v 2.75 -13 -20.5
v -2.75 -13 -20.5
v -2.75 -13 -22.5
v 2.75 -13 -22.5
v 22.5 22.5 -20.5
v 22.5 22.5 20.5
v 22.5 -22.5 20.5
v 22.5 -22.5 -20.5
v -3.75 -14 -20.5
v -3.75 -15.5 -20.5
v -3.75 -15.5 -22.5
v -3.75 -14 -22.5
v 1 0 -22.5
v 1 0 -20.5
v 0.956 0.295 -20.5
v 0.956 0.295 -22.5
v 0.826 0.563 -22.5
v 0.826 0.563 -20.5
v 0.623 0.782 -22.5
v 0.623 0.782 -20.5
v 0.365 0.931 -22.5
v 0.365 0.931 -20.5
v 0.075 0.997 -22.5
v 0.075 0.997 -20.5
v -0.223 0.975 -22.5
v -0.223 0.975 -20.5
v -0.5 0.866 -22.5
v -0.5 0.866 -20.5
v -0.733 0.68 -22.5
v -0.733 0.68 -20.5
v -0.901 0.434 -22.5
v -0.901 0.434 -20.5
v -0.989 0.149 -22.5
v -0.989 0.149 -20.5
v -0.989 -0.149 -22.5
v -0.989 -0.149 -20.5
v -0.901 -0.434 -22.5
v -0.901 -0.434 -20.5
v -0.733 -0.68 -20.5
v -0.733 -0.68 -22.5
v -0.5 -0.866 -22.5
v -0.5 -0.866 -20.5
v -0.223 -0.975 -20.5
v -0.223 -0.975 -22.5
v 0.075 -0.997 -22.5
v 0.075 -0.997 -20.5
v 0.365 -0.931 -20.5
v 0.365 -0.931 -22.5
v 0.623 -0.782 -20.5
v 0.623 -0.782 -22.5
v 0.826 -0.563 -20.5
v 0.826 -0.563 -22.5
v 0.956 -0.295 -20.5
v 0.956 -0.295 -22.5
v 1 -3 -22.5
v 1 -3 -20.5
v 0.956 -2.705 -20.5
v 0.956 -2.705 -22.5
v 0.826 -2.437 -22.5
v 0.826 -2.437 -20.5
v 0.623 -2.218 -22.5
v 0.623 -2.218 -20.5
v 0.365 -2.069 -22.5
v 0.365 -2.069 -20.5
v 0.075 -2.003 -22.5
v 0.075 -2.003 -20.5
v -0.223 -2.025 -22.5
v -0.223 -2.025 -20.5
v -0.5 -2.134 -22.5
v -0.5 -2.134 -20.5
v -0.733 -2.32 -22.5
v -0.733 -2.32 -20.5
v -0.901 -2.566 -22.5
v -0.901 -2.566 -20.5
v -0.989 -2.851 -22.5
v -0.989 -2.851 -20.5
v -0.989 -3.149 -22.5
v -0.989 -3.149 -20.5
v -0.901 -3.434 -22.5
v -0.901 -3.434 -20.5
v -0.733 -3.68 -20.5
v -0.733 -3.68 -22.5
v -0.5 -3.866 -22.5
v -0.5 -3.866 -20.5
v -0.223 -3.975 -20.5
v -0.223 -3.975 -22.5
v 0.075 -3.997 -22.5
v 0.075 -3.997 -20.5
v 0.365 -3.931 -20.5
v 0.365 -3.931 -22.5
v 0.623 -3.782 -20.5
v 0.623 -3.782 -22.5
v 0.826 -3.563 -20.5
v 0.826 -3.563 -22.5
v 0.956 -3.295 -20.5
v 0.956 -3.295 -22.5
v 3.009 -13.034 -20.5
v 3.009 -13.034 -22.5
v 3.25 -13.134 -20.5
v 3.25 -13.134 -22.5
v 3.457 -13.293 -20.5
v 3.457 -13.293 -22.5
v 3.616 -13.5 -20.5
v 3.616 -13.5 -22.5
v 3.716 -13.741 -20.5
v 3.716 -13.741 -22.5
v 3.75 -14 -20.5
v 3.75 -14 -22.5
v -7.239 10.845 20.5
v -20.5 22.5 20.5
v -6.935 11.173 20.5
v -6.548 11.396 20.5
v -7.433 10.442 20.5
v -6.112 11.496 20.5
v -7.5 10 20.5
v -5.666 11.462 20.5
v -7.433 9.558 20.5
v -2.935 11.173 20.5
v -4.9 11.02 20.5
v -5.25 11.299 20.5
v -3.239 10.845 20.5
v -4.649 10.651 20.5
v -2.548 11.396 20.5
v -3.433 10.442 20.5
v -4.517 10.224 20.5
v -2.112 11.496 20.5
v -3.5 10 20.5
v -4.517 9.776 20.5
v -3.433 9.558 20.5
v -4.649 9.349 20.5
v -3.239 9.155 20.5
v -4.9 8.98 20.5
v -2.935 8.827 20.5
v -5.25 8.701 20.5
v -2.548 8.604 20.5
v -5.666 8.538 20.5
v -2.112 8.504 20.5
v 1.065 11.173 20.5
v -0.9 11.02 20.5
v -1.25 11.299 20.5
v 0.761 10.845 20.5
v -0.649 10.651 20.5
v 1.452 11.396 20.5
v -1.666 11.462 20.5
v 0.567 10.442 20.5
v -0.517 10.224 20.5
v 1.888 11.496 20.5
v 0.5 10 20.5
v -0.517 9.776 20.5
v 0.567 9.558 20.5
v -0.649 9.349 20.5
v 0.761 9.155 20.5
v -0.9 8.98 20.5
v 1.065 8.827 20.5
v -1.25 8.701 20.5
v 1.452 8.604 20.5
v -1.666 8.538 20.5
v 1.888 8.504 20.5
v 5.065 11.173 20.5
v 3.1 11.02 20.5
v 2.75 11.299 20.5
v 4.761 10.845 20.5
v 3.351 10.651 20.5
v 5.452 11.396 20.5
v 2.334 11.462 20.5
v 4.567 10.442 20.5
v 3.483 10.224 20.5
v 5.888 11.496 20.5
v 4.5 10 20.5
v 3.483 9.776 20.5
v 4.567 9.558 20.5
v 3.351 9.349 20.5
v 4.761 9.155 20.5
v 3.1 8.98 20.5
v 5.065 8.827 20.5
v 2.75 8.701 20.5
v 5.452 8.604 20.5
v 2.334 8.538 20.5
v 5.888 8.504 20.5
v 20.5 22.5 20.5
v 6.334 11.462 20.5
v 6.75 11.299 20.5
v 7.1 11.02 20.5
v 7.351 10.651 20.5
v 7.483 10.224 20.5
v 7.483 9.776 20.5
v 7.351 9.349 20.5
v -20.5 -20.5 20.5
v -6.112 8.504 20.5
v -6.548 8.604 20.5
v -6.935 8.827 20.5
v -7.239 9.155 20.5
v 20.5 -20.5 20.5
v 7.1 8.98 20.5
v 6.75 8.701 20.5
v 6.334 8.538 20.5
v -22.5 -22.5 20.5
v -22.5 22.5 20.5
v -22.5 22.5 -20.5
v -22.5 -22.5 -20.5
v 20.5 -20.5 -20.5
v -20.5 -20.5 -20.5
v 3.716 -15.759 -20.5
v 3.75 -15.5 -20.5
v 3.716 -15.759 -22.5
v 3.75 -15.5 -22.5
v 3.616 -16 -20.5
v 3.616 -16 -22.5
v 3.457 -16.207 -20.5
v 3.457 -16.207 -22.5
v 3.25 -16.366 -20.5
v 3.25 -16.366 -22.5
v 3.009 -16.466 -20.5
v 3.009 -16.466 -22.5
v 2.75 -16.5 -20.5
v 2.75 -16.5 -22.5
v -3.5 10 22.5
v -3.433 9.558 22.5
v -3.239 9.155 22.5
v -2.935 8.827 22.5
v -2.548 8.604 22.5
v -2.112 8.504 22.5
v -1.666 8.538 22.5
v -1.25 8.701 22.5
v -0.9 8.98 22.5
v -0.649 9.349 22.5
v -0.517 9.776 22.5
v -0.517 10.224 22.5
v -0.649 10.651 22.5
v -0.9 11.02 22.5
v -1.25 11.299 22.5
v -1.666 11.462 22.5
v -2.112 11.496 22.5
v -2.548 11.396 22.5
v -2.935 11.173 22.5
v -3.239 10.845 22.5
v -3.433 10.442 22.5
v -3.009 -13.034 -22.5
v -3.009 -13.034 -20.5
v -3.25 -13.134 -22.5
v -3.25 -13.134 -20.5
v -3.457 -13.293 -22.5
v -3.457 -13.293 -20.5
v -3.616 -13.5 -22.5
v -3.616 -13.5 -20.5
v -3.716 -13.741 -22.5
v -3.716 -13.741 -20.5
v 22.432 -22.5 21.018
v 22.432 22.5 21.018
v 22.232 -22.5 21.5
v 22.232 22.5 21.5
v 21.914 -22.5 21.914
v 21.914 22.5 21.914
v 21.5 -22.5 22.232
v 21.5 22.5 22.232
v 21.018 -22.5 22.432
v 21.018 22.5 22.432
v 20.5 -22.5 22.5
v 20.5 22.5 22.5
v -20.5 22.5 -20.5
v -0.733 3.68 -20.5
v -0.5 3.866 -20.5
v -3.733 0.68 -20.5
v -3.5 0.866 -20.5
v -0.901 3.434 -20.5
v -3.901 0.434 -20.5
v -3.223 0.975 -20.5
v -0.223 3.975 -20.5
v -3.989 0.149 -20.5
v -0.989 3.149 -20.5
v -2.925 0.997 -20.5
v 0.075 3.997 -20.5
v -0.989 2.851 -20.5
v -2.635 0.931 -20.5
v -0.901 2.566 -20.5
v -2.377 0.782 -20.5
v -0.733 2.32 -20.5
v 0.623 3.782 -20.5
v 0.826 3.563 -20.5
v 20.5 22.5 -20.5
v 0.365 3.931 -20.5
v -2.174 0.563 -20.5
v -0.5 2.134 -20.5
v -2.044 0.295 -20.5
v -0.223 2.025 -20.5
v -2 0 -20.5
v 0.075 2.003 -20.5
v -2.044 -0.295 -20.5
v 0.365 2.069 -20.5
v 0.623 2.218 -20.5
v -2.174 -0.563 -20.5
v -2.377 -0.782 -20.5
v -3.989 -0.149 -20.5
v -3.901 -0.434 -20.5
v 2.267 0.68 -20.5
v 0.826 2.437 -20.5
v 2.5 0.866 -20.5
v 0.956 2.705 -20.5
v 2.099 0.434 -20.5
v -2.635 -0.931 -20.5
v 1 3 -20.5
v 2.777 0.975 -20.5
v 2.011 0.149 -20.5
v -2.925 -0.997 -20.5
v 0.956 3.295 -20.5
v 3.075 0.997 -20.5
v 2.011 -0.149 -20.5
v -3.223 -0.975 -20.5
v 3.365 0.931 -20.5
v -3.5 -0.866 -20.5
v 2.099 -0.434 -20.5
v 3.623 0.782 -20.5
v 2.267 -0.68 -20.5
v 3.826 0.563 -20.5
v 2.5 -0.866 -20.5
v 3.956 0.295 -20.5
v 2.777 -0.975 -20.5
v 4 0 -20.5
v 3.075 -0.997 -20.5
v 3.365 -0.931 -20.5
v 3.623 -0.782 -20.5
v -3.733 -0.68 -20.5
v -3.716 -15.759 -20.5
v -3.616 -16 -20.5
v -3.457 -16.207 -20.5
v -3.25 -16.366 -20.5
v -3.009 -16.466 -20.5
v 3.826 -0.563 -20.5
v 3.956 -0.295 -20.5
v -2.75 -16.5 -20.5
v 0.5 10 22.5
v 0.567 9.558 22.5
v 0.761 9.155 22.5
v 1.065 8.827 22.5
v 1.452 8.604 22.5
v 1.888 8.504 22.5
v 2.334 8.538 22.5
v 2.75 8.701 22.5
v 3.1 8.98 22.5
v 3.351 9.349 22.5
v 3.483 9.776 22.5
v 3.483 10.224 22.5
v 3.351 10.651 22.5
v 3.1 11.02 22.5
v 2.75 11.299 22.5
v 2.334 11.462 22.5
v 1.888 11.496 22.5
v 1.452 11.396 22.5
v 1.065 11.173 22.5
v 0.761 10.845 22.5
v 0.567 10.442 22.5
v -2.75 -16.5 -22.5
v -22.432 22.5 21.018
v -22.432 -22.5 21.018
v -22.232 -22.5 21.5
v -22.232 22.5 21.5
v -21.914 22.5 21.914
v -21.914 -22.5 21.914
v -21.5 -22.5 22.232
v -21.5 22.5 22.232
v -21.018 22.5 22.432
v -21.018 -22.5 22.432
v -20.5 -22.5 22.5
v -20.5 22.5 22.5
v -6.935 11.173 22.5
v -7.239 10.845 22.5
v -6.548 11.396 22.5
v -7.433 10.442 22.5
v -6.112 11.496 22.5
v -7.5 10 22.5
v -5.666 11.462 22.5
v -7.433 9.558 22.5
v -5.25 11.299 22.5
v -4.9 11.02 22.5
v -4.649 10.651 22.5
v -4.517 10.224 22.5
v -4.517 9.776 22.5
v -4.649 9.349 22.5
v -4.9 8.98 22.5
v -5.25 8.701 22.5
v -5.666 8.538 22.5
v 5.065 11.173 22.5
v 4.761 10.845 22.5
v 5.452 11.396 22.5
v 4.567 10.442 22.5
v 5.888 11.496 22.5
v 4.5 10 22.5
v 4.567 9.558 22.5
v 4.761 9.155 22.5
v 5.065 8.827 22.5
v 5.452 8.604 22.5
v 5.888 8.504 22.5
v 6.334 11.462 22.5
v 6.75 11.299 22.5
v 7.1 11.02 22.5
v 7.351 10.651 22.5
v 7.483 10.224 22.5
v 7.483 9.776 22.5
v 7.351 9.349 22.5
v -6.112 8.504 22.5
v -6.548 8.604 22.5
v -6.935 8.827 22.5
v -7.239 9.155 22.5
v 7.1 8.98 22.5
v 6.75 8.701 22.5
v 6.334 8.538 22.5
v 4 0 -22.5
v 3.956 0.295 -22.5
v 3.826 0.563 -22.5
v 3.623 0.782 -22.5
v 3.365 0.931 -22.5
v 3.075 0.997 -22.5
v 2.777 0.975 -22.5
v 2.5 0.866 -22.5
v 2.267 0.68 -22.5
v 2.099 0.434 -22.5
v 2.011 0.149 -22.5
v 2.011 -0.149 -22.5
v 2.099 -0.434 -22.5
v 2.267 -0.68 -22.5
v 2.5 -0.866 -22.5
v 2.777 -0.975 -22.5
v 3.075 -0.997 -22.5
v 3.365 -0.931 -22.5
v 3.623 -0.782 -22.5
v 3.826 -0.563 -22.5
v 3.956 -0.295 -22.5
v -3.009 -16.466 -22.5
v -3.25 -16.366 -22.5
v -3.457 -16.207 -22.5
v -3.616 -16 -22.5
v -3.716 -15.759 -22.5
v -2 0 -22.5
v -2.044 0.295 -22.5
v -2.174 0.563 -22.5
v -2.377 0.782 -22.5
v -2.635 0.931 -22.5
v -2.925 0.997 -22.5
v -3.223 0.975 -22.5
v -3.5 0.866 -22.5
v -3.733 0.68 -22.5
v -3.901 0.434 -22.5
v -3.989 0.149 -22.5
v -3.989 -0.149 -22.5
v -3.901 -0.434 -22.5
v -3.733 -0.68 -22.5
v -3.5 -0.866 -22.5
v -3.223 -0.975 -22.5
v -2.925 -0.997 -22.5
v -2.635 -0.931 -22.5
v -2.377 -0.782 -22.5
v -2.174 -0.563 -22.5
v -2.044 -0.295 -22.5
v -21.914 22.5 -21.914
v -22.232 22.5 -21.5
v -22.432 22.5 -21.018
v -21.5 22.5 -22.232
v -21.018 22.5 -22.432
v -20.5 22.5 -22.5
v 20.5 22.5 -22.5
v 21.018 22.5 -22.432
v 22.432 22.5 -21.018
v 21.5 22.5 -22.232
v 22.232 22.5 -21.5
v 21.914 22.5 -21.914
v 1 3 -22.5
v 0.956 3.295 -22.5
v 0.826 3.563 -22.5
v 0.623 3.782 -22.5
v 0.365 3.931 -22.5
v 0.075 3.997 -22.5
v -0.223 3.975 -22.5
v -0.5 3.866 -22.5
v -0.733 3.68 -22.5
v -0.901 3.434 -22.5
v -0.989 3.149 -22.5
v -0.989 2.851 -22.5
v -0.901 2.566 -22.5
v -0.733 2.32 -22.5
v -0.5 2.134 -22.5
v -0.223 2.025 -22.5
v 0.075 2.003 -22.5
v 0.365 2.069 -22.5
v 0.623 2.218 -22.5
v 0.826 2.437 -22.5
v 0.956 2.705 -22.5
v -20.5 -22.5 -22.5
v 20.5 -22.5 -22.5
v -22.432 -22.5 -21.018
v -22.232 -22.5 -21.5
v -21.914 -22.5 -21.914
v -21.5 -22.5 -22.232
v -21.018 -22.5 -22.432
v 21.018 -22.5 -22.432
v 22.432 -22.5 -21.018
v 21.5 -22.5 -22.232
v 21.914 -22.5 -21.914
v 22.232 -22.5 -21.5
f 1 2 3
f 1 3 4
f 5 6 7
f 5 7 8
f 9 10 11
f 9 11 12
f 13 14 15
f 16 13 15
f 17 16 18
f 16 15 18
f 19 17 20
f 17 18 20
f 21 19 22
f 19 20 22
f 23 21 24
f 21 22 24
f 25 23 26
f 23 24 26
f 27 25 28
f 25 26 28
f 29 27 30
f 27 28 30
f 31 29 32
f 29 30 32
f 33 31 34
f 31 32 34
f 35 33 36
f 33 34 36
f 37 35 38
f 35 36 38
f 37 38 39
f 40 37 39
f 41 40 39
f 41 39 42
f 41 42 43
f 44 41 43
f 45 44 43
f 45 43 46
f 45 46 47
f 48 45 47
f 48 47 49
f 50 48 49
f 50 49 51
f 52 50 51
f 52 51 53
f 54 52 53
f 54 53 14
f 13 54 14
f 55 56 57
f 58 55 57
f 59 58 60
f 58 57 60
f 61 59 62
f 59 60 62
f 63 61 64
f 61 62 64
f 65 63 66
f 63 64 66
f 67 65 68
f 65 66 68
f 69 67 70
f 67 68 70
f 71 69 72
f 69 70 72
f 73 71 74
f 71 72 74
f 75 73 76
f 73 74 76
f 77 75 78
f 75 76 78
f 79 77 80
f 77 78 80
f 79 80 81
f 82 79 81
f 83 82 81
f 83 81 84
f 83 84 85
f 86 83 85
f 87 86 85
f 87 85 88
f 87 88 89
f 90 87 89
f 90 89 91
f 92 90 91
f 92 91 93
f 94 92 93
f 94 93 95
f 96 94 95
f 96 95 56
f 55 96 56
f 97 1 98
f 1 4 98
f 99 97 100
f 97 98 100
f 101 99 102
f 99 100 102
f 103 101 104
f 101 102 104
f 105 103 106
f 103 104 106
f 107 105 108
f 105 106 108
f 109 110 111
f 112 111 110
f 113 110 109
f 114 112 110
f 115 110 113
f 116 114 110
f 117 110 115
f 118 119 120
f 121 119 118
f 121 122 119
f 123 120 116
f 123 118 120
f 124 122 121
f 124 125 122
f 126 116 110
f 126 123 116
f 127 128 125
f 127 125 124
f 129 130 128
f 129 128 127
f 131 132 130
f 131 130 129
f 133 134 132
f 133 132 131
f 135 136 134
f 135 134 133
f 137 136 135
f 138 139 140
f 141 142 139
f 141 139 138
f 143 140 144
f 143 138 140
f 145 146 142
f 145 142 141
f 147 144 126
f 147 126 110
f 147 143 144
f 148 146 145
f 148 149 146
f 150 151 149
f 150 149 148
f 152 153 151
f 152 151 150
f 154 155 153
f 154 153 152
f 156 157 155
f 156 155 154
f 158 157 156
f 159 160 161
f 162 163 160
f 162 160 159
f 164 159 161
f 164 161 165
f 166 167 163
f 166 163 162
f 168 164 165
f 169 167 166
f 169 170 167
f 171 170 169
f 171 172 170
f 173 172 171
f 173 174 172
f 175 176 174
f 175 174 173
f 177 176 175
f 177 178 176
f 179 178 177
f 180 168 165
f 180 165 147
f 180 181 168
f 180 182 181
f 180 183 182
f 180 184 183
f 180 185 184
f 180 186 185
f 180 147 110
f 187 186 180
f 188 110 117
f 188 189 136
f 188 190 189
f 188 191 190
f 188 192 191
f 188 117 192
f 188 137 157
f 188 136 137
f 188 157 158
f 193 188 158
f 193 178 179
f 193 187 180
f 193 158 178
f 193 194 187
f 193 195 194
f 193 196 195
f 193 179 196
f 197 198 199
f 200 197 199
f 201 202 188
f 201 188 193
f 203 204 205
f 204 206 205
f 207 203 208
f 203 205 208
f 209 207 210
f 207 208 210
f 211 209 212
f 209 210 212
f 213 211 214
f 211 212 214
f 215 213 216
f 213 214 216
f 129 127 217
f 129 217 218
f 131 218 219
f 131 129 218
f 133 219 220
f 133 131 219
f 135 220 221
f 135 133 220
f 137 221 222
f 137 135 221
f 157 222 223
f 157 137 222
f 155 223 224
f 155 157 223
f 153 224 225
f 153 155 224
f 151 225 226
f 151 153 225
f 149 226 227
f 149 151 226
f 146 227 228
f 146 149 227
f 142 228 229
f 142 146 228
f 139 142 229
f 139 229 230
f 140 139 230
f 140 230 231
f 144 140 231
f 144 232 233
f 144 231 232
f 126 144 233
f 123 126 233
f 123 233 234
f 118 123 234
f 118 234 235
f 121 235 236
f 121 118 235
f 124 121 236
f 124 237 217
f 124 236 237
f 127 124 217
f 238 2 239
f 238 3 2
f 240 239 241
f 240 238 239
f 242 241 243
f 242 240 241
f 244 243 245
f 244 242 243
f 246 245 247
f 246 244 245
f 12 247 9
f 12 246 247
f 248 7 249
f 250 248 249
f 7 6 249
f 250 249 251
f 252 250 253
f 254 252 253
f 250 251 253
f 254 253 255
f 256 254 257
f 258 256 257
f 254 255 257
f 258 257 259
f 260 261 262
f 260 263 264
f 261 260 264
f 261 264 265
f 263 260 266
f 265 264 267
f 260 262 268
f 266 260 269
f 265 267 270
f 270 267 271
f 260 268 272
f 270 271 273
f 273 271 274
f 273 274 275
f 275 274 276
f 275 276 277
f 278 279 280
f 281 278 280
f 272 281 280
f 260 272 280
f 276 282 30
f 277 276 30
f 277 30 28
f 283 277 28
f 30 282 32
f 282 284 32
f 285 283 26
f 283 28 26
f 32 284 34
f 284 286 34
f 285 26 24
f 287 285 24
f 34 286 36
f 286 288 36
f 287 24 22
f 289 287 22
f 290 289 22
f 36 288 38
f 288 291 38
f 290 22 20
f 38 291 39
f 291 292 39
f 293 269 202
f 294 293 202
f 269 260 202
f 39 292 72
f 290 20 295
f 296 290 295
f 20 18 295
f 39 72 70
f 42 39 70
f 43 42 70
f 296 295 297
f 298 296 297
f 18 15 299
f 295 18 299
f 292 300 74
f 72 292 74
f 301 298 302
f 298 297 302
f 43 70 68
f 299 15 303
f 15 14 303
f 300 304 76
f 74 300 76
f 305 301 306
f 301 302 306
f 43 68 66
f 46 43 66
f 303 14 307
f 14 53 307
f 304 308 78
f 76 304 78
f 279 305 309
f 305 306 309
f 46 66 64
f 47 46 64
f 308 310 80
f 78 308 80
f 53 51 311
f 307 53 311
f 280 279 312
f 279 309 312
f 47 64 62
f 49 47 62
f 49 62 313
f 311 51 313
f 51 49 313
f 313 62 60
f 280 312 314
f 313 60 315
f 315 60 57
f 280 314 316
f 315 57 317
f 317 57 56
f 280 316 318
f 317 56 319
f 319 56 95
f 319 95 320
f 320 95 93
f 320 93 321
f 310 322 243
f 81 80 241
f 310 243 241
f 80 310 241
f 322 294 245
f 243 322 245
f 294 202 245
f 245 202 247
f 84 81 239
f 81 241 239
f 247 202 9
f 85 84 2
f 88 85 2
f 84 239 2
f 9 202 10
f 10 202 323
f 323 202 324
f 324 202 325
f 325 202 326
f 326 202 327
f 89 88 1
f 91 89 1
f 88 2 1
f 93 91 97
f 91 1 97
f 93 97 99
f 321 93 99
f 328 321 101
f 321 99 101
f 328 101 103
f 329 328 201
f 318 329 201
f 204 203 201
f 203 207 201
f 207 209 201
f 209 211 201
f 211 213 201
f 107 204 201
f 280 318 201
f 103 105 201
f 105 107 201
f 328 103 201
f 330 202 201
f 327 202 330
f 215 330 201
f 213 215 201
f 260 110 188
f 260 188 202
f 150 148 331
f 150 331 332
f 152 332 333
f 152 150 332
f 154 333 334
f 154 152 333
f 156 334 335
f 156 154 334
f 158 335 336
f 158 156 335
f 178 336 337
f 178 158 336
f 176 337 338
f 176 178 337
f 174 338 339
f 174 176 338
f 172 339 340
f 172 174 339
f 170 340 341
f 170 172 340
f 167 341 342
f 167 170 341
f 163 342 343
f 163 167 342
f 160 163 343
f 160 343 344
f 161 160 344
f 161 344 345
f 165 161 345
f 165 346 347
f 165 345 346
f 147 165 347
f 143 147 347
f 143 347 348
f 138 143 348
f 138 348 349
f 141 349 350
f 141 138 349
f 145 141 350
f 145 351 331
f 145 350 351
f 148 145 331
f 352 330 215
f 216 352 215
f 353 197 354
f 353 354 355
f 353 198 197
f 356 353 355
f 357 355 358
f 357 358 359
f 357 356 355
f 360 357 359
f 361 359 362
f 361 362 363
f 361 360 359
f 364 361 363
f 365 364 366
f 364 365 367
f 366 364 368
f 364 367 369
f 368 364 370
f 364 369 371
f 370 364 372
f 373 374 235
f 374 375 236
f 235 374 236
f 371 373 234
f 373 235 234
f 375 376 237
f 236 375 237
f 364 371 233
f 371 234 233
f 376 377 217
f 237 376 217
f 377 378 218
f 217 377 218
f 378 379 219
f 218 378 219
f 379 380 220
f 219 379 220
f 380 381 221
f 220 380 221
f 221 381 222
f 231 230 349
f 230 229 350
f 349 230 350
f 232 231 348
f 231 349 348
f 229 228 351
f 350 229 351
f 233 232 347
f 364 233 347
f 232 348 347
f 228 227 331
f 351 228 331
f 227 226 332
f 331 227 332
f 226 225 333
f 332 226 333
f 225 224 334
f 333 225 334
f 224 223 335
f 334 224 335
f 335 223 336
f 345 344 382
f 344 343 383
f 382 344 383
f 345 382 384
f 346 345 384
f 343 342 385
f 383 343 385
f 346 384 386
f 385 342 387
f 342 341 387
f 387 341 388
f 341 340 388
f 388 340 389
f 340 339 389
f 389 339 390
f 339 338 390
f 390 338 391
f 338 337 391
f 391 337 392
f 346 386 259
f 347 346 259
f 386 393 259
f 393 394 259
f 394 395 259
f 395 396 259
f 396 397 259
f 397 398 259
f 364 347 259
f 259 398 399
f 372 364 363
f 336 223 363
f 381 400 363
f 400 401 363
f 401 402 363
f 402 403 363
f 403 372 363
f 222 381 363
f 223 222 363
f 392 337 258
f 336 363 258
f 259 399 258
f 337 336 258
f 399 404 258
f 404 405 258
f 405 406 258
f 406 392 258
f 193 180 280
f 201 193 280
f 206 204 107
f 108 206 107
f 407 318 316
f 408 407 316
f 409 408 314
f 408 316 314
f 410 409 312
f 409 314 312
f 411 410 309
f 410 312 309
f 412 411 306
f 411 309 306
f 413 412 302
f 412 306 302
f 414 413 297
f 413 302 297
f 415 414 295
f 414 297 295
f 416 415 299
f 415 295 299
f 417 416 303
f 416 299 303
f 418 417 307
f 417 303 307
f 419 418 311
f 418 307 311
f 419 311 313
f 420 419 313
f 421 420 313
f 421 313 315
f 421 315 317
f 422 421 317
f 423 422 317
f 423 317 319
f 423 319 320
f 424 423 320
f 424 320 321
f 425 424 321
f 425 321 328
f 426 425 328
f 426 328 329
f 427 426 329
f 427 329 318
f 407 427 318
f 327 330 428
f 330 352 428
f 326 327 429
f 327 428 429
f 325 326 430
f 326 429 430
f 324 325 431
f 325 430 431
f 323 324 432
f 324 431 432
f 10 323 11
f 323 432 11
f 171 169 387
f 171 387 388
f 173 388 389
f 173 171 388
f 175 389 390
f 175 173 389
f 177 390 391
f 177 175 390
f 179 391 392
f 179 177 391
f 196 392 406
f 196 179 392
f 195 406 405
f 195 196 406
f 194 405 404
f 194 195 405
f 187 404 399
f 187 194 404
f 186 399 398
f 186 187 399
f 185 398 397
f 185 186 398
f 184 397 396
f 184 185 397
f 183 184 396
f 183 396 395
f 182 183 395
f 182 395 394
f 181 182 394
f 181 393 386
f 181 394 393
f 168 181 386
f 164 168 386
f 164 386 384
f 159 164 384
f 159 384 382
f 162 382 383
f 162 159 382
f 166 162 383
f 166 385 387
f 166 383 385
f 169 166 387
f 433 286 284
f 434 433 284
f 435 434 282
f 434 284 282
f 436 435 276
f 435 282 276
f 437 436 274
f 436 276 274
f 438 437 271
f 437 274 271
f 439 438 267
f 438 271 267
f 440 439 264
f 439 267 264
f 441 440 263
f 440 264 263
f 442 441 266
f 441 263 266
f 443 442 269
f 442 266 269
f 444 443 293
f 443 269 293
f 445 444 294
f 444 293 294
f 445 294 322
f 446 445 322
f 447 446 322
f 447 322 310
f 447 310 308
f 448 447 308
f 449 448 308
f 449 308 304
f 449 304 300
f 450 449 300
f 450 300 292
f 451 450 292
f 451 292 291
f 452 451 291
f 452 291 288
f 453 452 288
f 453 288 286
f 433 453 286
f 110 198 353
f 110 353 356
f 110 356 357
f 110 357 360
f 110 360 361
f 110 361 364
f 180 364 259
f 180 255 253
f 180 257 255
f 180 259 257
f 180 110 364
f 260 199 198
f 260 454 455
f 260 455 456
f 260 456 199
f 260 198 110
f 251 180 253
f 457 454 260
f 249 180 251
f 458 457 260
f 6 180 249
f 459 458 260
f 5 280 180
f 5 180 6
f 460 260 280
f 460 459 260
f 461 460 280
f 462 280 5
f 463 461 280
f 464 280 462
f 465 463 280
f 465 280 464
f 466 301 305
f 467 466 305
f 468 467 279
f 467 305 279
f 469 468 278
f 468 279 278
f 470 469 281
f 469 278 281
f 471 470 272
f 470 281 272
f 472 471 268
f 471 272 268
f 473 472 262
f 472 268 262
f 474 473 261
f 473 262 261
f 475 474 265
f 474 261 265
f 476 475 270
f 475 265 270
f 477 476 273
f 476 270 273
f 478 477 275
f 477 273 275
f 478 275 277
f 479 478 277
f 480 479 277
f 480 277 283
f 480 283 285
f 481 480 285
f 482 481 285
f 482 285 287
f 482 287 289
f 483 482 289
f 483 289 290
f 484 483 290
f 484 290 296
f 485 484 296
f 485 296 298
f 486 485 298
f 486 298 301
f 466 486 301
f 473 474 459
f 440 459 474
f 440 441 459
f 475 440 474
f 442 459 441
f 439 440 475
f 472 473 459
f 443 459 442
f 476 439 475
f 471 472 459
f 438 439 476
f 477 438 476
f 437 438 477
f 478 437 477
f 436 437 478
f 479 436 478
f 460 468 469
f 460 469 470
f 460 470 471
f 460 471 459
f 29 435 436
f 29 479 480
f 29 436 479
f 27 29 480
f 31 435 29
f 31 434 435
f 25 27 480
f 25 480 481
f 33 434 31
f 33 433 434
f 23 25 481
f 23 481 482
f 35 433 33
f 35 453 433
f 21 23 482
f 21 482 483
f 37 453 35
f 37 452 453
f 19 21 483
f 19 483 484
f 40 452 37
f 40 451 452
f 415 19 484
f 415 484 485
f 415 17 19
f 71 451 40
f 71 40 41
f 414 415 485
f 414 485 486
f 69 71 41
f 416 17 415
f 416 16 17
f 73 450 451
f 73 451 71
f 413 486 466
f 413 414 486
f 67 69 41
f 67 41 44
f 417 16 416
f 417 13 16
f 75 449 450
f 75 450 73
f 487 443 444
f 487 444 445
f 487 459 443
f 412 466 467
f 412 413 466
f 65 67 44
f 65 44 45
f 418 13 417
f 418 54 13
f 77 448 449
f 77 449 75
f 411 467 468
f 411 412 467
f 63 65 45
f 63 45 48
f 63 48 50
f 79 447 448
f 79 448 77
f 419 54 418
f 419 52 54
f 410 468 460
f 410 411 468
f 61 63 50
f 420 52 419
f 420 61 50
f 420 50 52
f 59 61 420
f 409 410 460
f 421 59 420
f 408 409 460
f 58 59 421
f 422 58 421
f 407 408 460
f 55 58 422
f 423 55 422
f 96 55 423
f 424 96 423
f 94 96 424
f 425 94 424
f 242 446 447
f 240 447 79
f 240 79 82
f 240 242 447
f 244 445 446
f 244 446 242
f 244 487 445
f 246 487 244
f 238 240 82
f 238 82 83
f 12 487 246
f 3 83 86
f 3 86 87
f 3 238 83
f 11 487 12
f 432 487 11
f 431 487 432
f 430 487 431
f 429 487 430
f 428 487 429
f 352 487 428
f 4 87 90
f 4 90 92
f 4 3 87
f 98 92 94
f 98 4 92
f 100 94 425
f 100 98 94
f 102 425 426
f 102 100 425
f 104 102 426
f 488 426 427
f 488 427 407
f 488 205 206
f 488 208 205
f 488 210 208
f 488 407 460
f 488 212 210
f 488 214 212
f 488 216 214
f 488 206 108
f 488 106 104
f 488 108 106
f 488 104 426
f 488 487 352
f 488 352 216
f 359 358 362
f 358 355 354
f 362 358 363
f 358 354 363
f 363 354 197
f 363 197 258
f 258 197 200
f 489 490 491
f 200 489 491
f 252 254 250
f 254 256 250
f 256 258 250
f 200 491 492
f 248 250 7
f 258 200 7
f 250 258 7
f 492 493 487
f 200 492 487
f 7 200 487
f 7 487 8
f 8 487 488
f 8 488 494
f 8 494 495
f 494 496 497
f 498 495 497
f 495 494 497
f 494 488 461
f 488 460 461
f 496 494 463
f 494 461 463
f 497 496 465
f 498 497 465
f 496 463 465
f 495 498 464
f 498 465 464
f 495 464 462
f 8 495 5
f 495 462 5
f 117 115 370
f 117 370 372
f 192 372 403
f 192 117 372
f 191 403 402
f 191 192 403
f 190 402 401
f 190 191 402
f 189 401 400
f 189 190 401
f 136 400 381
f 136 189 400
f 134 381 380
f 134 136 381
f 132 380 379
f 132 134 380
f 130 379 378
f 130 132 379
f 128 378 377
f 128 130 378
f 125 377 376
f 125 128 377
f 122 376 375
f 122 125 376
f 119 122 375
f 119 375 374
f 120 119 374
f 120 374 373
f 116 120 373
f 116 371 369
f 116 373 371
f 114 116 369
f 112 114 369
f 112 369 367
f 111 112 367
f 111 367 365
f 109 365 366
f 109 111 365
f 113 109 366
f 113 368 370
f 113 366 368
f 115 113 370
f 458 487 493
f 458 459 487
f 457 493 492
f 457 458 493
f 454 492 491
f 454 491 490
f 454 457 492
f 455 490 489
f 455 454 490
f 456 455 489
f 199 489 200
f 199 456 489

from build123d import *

# Parameters (mm, degrees)
BOSS_EXTRUDE2_DEPTH      = 22.5
BOSS_EXTRUDE2_DEPTH_BACK = 22.5
SKETCH4_W                = 45
SKETCH4_H                = 45
CUT_EXTRUDE1_DEPTH       = 22.5
CUT_EXTRUDE1_DEPTH_BACK  = 20.5
SKETCH5_W                = 41
SKETCH5_H                = 41
SKETCH6_R                = 1.5
CUT_EXTRUDE2_DEPTH       = 32.5
SKETCH8_R                = 1
CUT_EXTRUDE3_DEPTH       = 32.5
SKETCH9_W                = 7.5
SKETCH9_H                = 3.5
CUT_EXTRUDE4_DEPTH       = 32.5
FILLET2_R                = 1
FILLET3_R                = 2


with BuildPart() as part:
    # Sketch4 → Boss-Extrude2 (new, two sides: drawn at the far end of the back side and taken through both)
    with BuildSketch(Plane(origin=(0, 0, 0), x_dir=(1, 0, 0), z_dir=(0, 1, 0)).offset(-BOSS_EXTRUDE2_DEPTH_BACK)):
        Rectangle(SKETCH4_W, SKETCH4_H)
    extrude(amount=BOSS_EXTRUDE2_DEPTH + BOSS_EXTRUDE2_DEPTH_BACK)

    # Sketch5 → Cut-Extrude1 (cut, two sides: drawn at the far end of the back side and taken through both)
    with BuildSketch(Plane(origin=(0, 0, 0), x_dir=(1, 0, 0), z_dir=(0, 1, 0)).offset(-CUT_EXTRUDE1_DEPTH_BACK)):
        Rectangle(SKETCH5_W, SKETCH5_H)
    extrude(amount=CUT_EXTRUDE1_DEPTH + CUT_EXTRUDE1_DEPTH_BACK, mode=Mode.SUBTRACT)

    # Sketch6 → Cut-Extrude2 (cut)
    with BuildSketch(Plane.XY):
        with Locations((2, 10)):
            Circle(SKETCH6_R)
        with Locations((6, 10)):
            Circle(SKETCH6_R)
        with Locations((-2, 10)):
            Circle(SKETCH6_R)
        with Locations((-6, 10)):
            Circle(SKETCH6_R)
    extrude(amount=CUT_EXTRUDE2_DEPTH, mode=Mode.SUBTRACT)

    # Sketch8 → Cut-Extrude3 (cut)
    with BuildSketch(Plane.XY):
        Circle(SKETCH8_R)
        with Locations((3, 0)):
            Circle(SKETCH8_R)
        with Locations((0, 3)):
            Circle(SKETCH8_R)
        with Locations((-3, 0)):
            Circle(SKETCH8_R)
        with Locations((0, -3)):
            Circle(SKETCH8_R)
    extrude(amount=-CUT_EXTRUDE3_DEPTH, mode=Mode.SUBTRACT)

    # Sketch9 → Cut-Extrude4 (cut)
    with BuildSketch(Plane.XY):
        with Locations((0, -14.75)):
            Rectangle(SKETCH9_W, SKETCH9_H)
    extrude(amount=-CUT_EXTRUDE4_DEPTH, mode=Mode.SUBTRACT)

    # Fillet2
    fillet2_edges = [part.edges().sort_by_distance(p)[0] for p in [
        (-3.75, -16.5, -21.5),
        (3.75, -16.5, -21.5),
        (-3.75, -13, -21.5),
        (3.75, -13, -21.5),
    ]]
    fillet(fillet2_edges, radius=FILLET2_R)

    # Fillet3
    fillet3_edges = [part.edges().sort_by_distance(p)[0] for p in [
        (-22.5, 0, 22.5),
        (22.5, 0, -22.5),
        (22.5, 0, 22.5),
        (-22.5, 0, -22.5),
    ]]
    fillet(fillet3_edges, radius=FILLET3_R)


solid = part.part
